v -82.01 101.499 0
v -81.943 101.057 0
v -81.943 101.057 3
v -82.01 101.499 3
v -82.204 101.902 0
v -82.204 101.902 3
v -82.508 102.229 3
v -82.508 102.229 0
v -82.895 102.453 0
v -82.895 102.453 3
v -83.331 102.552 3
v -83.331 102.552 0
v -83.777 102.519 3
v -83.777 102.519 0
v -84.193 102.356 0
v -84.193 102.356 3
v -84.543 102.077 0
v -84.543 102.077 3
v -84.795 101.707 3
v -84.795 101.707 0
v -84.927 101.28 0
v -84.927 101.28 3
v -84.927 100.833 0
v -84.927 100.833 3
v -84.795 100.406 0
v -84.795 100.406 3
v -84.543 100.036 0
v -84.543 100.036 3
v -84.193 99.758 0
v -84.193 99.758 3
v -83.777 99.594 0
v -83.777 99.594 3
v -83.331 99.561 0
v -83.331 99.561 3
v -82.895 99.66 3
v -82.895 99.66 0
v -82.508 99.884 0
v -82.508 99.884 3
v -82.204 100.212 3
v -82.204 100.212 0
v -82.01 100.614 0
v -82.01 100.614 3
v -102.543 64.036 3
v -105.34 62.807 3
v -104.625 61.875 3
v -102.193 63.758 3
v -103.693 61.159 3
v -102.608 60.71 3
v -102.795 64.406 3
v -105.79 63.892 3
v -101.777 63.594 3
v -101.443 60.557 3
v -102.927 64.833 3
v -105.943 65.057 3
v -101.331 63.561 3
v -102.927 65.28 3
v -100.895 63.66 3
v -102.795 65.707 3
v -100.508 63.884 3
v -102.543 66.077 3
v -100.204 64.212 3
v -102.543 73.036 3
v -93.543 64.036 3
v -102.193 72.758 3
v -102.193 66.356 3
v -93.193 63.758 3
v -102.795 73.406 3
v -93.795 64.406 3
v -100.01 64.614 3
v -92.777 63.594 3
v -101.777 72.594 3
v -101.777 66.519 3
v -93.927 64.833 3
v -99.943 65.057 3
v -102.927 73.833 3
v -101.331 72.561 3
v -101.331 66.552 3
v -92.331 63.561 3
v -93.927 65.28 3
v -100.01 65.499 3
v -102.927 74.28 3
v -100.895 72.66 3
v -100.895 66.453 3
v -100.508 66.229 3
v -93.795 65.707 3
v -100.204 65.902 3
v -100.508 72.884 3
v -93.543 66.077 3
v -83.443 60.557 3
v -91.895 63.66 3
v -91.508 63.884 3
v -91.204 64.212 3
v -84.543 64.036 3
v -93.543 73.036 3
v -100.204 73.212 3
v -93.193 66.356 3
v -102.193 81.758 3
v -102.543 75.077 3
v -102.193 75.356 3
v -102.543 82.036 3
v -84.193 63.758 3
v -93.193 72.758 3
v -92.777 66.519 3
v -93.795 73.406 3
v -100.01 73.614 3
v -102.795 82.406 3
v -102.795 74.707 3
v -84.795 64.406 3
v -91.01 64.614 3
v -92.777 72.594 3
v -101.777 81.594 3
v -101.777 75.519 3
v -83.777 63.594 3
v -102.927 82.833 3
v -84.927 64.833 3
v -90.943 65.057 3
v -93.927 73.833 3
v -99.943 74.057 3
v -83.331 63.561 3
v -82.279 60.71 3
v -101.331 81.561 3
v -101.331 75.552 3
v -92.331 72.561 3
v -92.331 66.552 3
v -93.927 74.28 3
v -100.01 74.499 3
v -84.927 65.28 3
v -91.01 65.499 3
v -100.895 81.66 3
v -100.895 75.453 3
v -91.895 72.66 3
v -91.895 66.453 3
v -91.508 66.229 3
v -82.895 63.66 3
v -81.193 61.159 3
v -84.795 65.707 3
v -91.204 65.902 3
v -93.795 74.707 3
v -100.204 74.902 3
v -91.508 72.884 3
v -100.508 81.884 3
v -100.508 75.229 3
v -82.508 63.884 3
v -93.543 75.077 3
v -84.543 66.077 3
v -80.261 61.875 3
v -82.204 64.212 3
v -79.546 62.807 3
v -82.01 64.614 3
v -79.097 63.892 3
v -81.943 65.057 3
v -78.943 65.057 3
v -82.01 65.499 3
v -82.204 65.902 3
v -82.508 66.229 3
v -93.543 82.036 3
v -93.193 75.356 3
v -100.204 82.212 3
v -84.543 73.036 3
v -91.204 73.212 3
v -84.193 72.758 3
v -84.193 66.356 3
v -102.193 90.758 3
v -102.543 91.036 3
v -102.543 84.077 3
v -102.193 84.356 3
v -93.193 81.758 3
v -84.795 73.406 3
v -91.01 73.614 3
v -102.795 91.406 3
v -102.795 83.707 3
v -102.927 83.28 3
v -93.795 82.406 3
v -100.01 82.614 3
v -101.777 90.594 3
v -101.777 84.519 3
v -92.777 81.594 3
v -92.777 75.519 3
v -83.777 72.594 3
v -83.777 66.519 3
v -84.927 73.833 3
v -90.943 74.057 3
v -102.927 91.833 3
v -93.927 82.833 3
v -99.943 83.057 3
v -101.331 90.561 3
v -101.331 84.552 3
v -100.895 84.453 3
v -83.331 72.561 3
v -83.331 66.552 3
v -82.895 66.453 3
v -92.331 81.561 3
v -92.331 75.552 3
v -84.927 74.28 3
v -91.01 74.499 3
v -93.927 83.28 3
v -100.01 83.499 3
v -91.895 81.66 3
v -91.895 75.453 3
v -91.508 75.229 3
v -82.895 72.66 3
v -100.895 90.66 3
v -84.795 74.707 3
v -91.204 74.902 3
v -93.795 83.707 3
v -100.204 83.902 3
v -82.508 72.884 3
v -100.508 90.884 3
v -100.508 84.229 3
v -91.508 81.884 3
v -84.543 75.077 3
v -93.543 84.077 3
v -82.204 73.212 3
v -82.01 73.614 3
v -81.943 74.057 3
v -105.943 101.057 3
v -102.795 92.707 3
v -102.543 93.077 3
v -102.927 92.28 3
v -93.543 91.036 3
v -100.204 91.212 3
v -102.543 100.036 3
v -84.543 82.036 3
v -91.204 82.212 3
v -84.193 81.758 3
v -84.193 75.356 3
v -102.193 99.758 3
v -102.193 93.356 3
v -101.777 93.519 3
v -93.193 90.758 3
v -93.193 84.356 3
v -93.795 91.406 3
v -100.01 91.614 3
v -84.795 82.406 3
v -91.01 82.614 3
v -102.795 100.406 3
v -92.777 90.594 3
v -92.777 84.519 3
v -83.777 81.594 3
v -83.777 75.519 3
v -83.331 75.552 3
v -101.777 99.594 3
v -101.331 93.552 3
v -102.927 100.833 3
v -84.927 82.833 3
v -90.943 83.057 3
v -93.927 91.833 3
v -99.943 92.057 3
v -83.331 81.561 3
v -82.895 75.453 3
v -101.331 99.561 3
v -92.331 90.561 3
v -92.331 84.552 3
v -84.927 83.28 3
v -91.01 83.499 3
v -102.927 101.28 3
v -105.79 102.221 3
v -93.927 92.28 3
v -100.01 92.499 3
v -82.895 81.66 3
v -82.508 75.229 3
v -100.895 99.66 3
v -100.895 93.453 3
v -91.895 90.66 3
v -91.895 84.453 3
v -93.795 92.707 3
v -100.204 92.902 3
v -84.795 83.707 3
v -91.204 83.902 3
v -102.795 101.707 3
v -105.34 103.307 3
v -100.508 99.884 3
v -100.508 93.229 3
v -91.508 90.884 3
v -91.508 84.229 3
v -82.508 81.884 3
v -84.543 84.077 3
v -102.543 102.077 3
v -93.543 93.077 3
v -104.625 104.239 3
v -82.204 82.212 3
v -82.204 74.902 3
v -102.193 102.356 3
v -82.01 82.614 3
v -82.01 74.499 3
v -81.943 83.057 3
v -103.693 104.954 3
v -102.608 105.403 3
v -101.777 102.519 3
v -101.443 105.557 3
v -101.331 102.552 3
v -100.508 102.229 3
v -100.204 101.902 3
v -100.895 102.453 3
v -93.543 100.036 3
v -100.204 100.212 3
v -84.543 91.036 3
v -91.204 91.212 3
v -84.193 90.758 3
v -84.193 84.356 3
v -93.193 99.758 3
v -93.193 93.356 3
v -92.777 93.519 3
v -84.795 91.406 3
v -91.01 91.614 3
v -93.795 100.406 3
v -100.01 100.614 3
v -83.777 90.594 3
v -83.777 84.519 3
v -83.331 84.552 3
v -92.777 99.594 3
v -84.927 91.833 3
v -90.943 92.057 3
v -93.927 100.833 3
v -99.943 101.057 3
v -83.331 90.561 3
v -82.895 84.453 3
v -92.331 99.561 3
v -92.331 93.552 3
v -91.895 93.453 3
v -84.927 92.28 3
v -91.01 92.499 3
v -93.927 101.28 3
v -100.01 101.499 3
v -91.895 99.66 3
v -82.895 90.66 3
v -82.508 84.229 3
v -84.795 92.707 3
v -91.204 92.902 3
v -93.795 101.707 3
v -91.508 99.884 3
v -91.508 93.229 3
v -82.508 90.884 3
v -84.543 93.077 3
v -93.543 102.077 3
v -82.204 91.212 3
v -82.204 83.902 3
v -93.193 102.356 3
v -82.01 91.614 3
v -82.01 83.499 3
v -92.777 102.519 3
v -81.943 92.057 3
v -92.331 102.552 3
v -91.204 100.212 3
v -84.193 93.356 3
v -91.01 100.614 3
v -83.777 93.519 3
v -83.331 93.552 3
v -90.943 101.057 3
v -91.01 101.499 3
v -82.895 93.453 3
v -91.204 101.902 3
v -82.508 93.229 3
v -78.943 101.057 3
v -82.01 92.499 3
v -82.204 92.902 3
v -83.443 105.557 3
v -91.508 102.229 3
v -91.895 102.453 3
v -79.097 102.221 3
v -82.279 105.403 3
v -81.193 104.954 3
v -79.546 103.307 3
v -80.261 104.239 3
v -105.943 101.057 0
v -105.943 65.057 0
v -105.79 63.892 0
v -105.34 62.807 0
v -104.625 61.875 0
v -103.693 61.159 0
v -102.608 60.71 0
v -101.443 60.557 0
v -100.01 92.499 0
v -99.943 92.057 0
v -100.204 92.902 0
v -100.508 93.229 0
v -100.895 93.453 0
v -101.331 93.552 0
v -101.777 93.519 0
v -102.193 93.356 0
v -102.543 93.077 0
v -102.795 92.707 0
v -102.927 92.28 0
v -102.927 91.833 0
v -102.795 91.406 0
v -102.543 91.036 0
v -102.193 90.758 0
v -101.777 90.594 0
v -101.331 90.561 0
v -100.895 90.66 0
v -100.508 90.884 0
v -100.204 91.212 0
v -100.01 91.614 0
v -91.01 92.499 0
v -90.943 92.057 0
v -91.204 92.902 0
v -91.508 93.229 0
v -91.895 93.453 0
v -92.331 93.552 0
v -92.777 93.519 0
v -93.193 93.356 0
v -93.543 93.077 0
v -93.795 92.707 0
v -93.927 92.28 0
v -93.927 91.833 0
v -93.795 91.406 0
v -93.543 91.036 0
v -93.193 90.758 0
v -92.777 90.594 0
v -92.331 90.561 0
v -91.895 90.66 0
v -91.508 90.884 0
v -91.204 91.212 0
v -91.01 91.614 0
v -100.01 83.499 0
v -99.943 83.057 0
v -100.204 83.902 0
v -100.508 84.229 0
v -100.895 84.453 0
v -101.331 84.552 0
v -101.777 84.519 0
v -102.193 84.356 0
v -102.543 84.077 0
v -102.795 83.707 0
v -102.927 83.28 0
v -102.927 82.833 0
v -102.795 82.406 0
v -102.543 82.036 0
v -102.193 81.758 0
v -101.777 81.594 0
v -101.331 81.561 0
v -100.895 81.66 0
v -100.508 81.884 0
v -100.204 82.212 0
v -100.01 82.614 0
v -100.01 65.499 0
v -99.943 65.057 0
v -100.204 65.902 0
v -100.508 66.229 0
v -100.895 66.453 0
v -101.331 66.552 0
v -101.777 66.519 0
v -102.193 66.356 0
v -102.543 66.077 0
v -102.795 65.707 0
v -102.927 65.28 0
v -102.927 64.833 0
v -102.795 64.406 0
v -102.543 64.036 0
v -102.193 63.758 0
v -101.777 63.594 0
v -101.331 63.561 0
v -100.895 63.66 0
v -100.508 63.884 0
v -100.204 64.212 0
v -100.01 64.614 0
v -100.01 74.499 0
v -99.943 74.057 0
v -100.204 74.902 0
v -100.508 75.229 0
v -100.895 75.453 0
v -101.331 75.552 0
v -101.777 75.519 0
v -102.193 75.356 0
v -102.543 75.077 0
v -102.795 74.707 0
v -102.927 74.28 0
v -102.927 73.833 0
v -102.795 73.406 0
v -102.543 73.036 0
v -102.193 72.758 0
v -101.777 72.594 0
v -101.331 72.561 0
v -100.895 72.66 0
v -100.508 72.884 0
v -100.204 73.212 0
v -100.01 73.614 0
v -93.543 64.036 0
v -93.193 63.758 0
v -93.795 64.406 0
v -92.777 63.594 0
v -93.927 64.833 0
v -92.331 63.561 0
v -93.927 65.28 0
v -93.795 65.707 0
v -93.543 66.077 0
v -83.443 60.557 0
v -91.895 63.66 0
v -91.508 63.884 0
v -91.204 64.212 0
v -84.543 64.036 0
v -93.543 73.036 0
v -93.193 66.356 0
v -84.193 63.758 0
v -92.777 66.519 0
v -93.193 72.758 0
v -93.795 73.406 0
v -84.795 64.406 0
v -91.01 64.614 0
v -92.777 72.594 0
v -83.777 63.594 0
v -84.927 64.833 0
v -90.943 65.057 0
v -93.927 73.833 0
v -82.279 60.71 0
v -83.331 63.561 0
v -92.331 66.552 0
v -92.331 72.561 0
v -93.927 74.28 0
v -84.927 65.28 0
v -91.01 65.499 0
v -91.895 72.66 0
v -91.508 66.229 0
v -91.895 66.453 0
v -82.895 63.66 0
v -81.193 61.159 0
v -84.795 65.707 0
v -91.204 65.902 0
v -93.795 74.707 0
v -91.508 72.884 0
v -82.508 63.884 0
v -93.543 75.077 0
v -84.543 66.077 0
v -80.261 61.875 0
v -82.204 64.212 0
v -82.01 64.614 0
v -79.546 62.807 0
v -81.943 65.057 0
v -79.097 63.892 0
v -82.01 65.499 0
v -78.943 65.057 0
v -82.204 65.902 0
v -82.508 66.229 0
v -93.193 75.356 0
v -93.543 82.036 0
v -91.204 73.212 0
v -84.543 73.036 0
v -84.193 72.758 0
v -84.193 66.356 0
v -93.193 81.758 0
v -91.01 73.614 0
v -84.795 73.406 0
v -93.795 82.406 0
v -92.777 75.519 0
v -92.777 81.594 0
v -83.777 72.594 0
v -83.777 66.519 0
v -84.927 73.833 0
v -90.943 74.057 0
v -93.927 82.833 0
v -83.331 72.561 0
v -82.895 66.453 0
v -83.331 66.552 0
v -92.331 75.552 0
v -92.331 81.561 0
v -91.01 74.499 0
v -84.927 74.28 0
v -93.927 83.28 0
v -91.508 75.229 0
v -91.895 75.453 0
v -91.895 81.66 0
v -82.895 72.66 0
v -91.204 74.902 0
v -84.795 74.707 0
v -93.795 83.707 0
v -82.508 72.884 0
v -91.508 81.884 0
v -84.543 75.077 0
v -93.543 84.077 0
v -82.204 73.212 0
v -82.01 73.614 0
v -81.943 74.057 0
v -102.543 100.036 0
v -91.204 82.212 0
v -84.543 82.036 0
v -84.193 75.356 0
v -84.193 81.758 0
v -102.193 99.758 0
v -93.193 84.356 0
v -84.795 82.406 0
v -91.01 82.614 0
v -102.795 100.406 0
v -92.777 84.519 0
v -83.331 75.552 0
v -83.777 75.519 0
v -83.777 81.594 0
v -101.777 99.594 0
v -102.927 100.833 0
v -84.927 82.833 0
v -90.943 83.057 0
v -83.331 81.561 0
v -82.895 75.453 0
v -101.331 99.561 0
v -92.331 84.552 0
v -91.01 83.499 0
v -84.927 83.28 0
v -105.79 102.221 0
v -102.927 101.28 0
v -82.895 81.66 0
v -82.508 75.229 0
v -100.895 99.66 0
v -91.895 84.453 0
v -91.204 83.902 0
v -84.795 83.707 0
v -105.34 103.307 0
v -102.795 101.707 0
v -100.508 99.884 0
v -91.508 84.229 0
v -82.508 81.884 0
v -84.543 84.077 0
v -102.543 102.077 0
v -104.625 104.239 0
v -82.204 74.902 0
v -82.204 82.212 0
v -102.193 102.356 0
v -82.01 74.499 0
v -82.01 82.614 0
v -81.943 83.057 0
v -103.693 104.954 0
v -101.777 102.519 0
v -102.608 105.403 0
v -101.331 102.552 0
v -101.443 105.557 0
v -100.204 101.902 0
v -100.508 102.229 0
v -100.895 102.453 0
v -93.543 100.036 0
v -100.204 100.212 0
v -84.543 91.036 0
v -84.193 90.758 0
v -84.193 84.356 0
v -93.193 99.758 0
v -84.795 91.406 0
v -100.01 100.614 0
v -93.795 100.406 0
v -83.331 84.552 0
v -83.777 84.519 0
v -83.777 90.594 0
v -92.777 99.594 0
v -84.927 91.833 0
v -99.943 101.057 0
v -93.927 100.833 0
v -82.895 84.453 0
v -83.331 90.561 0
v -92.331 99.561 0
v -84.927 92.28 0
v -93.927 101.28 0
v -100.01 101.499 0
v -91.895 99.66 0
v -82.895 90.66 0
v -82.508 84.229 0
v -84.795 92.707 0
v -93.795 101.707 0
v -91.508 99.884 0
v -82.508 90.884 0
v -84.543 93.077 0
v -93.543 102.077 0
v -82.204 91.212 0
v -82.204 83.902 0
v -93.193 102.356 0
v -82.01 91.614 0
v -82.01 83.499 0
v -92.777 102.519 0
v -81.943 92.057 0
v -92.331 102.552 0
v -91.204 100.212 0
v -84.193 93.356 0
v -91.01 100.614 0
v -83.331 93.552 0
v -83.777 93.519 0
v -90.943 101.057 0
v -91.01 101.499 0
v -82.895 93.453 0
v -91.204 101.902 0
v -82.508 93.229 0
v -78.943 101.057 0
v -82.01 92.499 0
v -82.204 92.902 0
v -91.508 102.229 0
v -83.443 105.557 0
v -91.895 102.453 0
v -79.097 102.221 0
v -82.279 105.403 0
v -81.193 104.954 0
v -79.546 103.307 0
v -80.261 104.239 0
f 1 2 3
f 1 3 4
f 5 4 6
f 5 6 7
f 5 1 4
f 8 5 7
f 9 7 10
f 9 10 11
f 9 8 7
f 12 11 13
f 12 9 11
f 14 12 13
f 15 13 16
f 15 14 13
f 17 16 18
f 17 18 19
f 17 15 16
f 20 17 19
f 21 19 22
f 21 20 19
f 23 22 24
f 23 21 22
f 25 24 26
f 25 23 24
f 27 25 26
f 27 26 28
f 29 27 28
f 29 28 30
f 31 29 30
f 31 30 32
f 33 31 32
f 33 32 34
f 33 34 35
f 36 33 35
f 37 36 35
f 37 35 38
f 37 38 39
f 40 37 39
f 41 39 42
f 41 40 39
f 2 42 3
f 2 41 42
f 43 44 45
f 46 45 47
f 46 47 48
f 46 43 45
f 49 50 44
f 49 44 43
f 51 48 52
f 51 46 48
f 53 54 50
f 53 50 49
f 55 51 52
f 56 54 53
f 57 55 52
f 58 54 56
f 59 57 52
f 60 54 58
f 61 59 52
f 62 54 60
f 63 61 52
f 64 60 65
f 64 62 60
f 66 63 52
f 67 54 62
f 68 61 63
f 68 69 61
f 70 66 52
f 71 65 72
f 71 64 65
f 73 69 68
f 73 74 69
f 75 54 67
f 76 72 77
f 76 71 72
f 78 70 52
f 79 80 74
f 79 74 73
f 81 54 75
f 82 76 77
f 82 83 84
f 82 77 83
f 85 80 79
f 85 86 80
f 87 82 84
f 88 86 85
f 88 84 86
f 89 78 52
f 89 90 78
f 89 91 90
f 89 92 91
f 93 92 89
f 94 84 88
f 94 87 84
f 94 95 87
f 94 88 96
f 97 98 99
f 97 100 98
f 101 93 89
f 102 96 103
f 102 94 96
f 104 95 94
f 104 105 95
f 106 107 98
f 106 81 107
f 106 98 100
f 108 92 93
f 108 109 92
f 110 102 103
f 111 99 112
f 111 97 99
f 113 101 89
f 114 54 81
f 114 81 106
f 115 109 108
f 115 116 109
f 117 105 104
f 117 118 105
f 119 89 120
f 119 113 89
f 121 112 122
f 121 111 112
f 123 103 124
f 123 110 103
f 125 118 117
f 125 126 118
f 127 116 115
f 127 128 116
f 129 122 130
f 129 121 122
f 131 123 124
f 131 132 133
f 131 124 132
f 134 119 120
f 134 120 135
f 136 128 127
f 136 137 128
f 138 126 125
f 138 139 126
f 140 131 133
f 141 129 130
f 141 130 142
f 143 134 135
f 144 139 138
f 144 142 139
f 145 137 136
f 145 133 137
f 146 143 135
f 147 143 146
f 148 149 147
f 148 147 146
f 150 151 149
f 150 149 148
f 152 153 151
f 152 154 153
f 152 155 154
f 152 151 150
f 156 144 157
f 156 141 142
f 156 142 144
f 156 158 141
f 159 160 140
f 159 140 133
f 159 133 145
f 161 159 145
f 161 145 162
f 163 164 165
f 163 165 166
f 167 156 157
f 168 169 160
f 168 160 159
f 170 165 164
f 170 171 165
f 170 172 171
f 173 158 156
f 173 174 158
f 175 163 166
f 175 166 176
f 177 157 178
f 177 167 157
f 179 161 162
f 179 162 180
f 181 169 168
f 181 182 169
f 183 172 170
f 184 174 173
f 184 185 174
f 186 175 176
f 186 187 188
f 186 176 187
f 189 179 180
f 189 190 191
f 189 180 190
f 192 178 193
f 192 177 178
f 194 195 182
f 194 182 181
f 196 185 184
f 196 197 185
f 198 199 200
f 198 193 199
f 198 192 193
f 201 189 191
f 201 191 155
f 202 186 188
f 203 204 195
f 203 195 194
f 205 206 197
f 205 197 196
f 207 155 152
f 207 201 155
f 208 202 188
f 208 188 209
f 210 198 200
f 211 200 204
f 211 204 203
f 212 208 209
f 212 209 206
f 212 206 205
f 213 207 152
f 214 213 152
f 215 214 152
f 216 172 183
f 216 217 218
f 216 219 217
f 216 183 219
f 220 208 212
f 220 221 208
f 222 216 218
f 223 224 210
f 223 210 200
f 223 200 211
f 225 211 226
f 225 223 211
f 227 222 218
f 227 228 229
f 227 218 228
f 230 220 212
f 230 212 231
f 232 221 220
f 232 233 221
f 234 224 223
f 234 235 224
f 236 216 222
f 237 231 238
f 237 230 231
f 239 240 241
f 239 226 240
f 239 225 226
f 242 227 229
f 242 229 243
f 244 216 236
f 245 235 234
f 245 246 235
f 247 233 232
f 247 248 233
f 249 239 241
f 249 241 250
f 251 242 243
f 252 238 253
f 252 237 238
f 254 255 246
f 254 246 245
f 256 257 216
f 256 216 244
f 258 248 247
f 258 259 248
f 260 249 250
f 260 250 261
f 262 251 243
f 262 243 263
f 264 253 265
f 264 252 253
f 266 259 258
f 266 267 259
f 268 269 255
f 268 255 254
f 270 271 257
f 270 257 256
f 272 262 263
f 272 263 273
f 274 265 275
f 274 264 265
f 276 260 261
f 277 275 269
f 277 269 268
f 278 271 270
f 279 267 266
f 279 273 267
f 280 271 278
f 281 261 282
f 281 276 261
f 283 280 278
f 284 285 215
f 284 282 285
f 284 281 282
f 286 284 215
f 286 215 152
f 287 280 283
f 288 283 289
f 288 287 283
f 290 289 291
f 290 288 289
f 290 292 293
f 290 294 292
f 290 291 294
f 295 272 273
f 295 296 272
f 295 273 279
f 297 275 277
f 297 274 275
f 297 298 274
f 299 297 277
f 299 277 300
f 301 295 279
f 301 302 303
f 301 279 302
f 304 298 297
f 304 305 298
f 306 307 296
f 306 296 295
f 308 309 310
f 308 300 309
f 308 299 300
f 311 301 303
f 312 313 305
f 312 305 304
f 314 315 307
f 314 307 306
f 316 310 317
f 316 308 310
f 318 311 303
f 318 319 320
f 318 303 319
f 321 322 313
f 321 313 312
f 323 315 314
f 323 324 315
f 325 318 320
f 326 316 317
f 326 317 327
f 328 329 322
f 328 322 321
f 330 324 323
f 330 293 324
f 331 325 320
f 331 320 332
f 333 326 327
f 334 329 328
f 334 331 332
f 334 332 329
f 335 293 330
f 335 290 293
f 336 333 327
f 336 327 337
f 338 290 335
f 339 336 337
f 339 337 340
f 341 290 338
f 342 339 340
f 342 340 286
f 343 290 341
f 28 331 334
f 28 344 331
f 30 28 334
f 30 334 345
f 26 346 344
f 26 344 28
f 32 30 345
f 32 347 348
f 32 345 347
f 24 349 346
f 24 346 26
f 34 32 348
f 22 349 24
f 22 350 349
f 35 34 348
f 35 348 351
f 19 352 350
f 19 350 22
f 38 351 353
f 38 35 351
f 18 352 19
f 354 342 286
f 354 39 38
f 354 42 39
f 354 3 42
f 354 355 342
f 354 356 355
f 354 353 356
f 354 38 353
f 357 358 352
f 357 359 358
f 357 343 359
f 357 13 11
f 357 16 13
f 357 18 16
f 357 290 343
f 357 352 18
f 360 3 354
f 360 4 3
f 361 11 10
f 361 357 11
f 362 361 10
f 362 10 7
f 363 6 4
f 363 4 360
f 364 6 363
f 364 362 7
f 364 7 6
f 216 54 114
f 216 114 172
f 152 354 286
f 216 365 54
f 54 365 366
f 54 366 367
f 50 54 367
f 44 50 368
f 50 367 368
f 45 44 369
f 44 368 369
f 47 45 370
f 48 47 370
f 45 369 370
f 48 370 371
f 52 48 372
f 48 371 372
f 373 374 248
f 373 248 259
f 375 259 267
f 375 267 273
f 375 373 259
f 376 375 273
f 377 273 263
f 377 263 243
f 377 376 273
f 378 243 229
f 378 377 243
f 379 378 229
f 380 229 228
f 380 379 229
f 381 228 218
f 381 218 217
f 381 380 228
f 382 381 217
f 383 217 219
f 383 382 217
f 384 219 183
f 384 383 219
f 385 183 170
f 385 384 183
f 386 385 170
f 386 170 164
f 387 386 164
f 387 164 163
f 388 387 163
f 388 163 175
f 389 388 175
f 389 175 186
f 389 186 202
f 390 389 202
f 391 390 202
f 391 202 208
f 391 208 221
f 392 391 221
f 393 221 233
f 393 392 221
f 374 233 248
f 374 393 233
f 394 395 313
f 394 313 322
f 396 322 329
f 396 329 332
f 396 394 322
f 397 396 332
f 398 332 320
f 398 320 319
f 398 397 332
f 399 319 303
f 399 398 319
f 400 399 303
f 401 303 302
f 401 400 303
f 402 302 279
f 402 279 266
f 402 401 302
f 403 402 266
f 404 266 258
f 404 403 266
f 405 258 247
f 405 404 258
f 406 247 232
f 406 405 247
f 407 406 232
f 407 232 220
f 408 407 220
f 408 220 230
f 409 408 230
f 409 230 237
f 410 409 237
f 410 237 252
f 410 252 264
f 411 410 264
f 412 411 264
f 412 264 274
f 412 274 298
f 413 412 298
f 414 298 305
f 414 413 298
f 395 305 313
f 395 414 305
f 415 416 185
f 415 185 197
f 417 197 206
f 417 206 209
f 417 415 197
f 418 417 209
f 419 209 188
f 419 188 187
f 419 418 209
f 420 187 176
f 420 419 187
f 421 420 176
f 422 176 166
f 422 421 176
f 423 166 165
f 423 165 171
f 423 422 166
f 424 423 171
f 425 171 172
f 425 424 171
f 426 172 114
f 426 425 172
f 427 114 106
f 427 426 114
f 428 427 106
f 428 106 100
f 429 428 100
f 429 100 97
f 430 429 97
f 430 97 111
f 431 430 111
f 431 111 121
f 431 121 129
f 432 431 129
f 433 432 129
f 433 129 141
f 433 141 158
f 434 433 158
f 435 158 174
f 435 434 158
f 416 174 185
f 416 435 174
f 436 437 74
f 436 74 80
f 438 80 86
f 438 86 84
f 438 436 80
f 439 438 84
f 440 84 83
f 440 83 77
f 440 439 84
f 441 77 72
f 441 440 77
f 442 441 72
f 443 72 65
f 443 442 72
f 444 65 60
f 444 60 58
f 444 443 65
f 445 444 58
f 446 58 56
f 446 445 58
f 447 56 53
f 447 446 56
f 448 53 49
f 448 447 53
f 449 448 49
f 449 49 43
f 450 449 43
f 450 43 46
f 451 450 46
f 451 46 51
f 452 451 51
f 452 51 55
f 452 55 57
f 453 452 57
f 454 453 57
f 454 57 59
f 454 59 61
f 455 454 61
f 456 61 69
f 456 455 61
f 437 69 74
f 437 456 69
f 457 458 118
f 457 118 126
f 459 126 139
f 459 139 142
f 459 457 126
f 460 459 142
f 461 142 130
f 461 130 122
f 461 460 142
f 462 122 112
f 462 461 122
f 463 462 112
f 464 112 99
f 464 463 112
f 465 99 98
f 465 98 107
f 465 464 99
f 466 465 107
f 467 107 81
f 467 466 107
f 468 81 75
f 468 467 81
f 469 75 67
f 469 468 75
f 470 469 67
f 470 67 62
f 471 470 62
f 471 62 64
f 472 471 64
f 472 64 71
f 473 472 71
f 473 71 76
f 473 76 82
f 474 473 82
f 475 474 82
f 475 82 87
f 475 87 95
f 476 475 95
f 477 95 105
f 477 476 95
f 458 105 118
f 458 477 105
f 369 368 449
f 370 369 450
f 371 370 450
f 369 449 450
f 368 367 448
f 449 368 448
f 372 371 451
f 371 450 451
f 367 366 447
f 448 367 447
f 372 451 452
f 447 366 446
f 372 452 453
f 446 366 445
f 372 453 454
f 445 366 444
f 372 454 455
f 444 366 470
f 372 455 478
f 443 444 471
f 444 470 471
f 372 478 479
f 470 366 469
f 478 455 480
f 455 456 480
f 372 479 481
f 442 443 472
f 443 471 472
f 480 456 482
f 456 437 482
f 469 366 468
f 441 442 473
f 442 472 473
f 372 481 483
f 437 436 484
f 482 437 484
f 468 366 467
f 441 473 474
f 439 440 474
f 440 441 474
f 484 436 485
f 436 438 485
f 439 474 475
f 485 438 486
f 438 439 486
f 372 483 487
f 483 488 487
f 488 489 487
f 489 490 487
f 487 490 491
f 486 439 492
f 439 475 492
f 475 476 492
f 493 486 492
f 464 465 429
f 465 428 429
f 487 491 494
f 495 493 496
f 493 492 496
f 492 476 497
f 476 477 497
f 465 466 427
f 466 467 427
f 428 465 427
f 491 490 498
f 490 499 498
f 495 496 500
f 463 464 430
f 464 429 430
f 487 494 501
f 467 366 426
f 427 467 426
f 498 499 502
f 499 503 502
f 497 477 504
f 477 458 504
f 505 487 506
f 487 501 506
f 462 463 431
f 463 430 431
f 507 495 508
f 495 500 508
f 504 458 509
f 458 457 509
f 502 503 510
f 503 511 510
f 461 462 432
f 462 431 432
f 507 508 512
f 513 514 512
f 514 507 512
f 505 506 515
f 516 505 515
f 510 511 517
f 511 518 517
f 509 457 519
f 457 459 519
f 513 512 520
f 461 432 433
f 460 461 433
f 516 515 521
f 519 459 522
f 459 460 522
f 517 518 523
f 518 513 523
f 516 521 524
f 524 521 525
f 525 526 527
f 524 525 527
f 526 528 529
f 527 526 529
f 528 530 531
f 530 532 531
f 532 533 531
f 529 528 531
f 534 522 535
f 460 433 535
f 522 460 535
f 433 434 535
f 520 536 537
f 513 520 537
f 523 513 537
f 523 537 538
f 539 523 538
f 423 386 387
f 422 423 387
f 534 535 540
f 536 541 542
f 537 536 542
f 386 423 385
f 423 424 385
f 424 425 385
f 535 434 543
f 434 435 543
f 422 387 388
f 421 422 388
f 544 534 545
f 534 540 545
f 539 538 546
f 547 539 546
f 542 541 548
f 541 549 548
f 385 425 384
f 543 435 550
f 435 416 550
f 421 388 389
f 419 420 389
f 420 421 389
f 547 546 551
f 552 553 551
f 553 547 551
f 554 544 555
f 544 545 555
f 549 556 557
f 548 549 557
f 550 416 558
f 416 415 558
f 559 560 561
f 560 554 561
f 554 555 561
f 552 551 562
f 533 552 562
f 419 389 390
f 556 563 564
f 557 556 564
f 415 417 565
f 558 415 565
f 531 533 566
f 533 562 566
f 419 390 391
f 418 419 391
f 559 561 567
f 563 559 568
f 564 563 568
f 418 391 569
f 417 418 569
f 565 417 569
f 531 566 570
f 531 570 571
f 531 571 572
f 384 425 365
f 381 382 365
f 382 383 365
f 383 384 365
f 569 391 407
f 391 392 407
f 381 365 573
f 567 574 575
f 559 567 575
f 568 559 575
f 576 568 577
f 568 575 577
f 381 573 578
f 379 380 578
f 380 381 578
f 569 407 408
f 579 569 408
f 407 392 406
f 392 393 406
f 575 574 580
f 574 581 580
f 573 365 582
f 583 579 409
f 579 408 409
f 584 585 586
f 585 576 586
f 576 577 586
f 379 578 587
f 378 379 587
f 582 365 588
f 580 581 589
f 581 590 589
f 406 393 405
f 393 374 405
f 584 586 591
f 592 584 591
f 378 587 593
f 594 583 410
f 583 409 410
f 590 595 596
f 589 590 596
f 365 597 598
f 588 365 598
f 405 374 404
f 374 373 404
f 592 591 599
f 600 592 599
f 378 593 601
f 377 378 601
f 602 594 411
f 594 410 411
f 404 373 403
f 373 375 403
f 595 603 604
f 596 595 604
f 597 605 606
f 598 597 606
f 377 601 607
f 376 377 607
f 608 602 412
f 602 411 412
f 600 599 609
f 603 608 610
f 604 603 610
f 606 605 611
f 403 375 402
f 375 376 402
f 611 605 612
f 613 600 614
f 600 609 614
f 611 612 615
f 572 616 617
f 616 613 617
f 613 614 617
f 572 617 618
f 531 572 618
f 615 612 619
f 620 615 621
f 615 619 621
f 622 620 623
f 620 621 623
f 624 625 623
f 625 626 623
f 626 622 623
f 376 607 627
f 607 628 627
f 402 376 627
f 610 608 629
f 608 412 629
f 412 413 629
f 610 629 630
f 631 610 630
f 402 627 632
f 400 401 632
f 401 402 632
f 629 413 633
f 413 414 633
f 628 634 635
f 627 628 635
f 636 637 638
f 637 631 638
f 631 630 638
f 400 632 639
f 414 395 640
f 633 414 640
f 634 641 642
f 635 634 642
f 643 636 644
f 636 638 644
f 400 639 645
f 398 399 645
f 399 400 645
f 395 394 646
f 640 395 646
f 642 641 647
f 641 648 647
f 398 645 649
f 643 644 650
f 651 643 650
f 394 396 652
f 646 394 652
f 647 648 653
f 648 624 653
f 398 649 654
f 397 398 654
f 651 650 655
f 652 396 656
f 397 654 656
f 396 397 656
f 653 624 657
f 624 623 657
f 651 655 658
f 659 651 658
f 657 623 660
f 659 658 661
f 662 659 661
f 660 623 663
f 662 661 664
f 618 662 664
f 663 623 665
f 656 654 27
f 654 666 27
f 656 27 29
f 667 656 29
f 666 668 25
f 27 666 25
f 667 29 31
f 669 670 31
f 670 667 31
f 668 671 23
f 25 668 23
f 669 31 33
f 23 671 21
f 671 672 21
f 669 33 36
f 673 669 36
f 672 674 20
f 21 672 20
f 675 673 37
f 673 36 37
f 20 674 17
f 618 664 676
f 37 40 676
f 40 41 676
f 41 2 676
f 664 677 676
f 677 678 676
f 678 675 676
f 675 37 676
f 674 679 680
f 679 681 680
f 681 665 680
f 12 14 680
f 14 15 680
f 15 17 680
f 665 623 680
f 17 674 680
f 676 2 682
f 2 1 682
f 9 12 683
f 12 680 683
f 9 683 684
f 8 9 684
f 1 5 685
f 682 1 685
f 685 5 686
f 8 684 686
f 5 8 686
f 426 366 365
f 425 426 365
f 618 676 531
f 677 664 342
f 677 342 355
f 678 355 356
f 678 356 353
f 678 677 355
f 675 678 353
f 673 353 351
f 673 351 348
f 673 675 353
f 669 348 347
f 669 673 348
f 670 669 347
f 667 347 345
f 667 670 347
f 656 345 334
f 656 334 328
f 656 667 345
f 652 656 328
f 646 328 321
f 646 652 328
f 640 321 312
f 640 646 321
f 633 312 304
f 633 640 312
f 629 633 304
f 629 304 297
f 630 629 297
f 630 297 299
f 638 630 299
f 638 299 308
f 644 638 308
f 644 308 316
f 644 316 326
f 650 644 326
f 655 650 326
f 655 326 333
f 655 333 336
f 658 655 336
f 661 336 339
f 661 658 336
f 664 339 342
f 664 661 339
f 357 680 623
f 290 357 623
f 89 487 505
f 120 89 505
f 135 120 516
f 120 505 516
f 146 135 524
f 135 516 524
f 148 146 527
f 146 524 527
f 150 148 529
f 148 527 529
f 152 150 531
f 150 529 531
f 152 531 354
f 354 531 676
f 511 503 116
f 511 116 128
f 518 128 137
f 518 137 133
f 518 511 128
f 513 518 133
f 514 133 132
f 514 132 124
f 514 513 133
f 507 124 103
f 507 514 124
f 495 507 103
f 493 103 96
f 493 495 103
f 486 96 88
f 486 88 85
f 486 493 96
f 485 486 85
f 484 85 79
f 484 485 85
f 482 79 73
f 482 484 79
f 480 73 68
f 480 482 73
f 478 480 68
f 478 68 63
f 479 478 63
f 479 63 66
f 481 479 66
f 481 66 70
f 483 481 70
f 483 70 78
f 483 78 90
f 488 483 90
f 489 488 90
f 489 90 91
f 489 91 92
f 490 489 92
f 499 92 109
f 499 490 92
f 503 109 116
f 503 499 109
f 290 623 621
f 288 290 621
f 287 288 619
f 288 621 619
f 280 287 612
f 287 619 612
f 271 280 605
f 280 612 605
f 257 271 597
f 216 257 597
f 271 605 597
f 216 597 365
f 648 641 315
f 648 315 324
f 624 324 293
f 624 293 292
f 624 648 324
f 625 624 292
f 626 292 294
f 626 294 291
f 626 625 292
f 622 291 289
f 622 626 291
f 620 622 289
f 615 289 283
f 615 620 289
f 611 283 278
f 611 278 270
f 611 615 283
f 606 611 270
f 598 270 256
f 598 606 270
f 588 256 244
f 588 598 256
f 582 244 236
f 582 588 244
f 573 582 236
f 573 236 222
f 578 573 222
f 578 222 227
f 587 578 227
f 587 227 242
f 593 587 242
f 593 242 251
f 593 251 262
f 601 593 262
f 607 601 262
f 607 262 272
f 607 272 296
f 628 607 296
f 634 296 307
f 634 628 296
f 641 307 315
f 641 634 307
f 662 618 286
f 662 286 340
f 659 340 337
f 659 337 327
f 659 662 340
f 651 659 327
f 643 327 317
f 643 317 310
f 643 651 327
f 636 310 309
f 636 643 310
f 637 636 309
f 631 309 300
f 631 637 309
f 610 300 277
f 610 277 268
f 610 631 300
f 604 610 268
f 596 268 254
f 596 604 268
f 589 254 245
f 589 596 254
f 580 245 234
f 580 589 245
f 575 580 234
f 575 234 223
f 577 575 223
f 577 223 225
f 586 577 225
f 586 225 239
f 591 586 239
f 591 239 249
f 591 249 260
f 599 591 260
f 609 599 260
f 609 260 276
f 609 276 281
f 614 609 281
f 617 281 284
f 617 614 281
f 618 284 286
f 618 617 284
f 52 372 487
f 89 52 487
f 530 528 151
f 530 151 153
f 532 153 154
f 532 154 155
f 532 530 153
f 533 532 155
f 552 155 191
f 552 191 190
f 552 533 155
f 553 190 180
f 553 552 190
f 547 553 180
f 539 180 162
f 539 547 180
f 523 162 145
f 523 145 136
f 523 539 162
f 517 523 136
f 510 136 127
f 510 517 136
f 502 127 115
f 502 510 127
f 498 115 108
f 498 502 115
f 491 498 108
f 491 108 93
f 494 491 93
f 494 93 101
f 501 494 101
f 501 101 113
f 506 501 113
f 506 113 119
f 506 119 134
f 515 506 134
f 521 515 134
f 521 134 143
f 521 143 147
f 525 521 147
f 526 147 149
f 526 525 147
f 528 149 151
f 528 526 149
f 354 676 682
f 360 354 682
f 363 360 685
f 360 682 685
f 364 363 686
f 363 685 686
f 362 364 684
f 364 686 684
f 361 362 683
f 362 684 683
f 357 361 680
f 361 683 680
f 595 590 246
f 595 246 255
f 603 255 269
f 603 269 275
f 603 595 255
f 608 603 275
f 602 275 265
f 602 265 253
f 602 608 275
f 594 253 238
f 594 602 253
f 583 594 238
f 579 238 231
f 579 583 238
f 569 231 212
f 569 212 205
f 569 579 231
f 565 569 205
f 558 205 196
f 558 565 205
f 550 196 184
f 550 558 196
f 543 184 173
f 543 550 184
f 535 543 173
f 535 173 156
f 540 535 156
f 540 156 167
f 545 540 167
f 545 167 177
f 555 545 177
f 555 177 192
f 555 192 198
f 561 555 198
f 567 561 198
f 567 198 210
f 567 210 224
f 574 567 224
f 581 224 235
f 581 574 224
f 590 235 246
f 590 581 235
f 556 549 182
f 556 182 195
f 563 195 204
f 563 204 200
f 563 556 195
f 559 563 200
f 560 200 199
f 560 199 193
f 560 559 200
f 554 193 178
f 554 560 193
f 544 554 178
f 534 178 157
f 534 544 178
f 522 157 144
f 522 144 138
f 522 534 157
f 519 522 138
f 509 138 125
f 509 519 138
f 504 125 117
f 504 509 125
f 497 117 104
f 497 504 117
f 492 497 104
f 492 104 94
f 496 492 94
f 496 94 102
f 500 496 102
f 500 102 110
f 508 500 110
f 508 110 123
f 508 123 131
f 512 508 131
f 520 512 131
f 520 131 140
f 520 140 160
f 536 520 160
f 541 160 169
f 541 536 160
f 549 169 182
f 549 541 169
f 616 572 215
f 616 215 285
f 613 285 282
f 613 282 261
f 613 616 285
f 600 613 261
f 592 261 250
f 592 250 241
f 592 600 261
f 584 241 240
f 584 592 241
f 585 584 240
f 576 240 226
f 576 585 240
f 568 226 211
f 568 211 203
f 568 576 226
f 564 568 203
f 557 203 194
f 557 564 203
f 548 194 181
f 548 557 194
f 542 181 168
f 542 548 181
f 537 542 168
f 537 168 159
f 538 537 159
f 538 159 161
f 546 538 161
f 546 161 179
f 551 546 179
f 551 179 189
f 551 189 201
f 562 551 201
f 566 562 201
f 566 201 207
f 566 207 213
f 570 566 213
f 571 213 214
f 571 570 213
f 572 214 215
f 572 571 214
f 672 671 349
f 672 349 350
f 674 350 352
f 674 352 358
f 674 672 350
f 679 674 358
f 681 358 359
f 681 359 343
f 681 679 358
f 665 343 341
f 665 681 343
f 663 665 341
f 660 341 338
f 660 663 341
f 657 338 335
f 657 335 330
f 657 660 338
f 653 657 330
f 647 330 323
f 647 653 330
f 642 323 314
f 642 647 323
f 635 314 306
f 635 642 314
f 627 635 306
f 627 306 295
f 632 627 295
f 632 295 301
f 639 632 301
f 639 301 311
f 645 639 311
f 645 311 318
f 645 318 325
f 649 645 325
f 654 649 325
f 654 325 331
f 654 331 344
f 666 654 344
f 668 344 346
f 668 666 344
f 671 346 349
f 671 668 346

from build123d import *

# Parameters (mm, degrees)
MODEL_R                 = 1.5
SALIENTE_EXTRUIR1_DEPTH = 3


with BuildPart() as part:
    # Model → Saliente-Extruir1 (new body)
    with BuildSketch(Plane.XY):
        with BuildLine():
            Line((-105.943383637, 101.056539338), (-105.943383637, 65.056539338))
            ThreePointArc((-105.943383637, 65.056539338), (-104.625364152, 61.874558823), (-101.443383637, 60.556539338))
            Line((-101.443383637, 60.556539338), (-83.443383637, 60.556539338))
            ThreePointArc((-83.443383637, 60.556539338), (-80.261403122, 61.874558823), (-78.943383637, 65.056539338))
            Line((-78.943383637, 65.056539338), (-78.943383637, 101.056539338))
            ThreePointArc((-78.943383637, 101.056539338), (-80.261403122, 104.238519853), (-83.443383637, 105.556539338))
            Line((-83.443383637, 105.556539338), (-101.443383637, 105.556539338))
            ThreePointArc((-101.443383637, 105.556539338), (-104.625364152, 104.238519853), (-105.943383637, 101.056539338))
        make_face()
        with Locations((-101.443383637, 101.056539338)):
            Circle(MODEL_R, mode=Mode.SUBTRACT)
        with Locations((-92.443383637, 101.056539338)):
            Circle(MODEL_R, mode=Mode.SUBTRACT)
        with Locations((-83.443383637, 101.056539338)):
            Circle(MODEL_R, mode=Mode.SUBTRACT)
        with Locations((-101.443383637, 92.056539338)):
            Circle(MODEL_R, mode=Mode.SUBTRACT)
        with Locations((-92.443383637, 92.056539338)):
            Circle(MODEL_R, mode=Mode.SUBTRACT)
        with Locations((-83.443383637, 92.056539338)):
            Circle(MODEL_R, mode=Mode.SUBTRACT)
        with Locations((-101.443383637, 83.056539338)):
            Circle(MODEL_R, mode=Mode.SUBTRACT)
        with Locations((-92.443383637, 83.056539338)):
            Circle(MODEL_R, mode=Mode.SUBTRACT)
        with Locations((-83.443383637, 83.056539338)):
            Circle(MODEL_R, mode=Mode.SUBTRACT)
        with Locations((-101.443383637, 74.056539338)):
            Circle(MODEL_R, mode=Mode.SUBTRACT)
        with Locations((-92.443383637, 74.056539338)):
            Circle(MODEL_R, mode=Mode.SUBTRACT)
        with Locations((-83.443383637, 74.056539338)):
            Circle(MODEL_R, mode=Mode.SUBTRACT)
        with Locations((-101.443383637, 65.056539338)):
            Circle(MODEL_R, mode=Mode.SUBTRACT)
        with Locations((-92.443383637, 65.056539338)):
            Circle(MODEL_R, mode=Mode.SUBTRACT)
        with Locations((-83.443383637, 65.056539338)):
            Circle(MODEL_R, mode=Mode.SUBTRACT)
    extrude(amount=SALIENTE_EXTRUIR1_DEPTH)


solid = part.part
